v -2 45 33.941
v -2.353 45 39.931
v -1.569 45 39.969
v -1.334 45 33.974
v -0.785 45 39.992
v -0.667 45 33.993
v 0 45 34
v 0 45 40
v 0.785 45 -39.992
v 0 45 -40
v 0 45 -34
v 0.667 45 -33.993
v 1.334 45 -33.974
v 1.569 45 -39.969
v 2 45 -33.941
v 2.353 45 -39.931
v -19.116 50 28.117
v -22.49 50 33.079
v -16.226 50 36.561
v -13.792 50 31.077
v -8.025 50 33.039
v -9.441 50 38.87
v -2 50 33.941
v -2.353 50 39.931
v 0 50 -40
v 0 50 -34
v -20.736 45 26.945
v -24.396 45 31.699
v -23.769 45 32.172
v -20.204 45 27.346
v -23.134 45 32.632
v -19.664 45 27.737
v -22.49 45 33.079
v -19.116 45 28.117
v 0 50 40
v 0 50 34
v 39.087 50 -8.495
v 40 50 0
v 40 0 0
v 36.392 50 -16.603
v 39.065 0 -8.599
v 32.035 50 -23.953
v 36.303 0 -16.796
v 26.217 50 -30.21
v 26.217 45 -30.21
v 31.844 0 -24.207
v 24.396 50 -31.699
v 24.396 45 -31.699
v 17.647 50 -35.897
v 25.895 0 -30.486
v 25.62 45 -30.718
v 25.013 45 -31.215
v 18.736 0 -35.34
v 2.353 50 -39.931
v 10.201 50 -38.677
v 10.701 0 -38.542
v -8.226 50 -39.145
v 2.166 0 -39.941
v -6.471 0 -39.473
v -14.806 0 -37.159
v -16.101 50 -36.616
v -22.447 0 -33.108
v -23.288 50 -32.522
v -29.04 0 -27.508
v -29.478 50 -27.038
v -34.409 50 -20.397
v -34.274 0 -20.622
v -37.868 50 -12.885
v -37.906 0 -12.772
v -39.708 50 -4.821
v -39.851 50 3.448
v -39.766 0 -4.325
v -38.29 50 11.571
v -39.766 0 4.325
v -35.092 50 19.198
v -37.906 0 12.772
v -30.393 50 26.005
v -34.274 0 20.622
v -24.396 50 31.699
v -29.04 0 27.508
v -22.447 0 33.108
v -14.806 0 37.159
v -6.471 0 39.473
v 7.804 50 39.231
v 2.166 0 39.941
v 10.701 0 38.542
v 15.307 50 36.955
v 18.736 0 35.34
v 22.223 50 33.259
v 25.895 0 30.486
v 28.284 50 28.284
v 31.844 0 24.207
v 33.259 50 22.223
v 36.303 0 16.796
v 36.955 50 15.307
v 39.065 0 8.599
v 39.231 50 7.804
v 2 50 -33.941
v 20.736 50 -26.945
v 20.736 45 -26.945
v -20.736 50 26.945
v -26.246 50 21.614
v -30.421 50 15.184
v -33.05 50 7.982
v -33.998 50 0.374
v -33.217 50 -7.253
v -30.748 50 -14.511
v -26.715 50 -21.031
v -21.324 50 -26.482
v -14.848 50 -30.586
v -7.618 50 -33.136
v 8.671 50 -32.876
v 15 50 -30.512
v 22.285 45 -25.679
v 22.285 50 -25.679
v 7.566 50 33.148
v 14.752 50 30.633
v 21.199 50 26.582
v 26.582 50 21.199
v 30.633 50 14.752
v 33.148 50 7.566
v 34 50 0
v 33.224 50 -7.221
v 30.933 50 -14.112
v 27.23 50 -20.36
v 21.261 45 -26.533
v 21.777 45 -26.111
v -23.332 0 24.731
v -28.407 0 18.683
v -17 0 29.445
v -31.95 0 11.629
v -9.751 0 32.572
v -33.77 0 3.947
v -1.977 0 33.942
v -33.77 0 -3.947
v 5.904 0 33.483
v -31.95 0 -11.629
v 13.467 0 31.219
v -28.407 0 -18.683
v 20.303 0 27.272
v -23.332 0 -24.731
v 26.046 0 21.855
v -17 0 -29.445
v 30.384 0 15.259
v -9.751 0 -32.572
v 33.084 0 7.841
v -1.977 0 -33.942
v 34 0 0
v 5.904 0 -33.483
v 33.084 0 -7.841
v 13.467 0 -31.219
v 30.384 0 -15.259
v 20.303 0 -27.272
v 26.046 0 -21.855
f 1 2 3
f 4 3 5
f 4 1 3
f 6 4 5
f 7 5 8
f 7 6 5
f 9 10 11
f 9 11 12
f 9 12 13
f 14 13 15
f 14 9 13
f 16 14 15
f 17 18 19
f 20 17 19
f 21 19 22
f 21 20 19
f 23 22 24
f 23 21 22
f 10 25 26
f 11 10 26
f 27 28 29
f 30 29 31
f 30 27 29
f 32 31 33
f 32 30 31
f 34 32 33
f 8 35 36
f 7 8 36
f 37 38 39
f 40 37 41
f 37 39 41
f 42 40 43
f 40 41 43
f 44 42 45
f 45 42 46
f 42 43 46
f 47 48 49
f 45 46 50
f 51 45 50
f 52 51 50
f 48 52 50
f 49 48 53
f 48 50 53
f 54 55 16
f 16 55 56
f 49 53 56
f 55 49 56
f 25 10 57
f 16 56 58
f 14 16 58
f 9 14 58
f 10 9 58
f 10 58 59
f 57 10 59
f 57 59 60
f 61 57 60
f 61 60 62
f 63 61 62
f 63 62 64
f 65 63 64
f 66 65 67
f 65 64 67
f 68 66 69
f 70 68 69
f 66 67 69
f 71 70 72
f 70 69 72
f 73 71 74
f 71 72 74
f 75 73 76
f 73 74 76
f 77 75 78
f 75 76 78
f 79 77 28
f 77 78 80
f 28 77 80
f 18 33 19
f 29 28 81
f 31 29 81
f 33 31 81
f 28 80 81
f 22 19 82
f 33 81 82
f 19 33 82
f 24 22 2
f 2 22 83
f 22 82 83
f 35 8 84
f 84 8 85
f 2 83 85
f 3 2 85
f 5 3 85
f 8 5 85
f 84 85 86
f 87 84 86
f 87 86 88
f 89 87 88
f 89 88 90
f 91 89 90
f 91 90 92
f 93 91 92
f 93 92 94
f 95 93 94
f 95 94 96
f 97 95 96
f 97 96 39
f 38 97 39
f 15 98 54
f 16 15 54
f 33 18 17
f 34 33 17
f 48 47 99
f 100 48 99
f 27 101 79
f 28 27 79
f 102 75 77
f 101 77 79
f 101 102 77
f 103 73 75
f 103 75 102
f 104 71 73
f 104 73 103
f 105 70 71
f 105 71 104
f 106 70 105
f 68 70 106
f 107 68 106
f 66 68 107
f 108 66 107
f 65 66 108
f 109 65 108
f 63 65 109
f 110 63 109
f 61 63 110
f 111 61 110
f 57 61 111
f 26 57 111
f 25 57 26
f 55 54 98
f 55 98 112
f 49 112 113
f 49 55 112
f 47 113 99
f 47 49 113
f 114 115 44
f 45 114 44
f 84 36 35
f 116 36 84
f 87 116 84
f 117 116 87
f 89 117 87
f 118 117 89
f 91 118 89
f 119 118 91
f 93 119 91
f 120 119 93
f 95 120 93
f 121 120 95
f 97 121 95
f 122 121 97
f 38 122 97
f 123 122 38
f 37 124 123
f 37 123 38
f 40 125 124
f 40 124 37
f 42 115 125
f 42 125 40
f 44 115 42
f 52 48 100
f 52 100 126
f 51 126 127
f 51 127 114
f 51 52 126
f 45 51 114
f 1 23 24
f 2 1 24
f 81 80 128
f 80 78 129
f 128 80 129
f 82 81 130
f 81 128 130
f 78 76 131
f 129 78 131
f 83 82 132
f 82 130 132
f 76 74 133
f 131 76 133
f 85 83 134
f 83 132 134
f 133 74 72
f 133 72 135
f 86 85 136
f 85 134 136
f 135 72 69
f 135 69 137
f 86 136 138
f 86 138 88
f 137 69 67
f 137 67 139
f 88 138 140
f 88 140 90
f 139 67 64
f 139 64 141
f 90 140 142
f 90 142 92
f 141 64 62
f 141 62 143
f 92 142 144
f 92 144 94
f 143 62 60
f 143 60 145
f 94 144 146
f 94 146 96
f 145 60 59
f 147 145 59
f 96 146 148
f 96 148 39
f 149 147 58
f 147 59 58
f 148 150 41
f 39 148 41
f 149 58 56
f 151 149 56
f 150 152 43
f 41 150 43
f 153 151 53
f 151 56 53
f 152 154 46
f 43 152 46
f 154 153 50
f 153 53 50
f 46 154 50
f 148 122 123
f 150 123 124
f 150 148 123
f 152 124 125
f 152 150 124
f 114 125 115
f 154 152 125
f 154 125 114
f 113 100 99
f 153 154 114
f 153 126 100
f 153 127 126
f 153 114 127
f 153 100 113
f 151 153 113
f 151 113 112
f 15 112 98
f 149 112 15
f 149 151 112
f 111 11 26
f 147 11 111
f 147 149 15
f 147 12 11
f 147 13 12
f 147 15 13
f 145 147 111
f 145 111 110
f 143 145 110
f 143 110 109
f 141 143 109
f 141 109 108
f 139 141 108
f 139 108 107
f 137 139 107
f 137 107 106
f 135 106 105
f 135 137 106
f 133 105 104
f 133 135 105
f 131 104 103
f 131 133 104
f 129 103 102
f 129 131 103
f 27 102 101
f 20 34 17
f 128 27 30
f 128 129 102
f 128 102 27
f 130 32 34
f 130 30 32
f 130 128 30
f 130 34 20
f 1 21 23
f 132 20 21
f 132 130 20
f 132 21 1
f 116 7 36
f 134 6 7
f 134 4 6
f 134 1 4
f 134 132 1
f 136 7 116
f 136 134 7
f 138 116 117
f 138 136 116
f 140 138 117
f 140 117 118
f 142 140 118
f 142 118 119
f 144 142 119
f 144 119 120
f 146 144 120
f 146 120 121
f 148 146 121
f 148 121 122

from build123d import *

# Parameters (mm, degrees)
ESQUISSE1_R      = 40
ESQUISSE1_R_2    = 34
EXTRUSION1_DEPTH = 50
EXTRUSION2_DEPTH = 5


with BuildPart() as part:
    # Esquisse1 → Extrusion1 (new body)
    with BuildSketch(Plane(origin=(0, 0, 0), x_dir=(1, 0, 0), z_dir=(0, 1, 0))):
        Circle(ESQUISSE1_R)
        Circle(ESQUISSE1_R_2, mode=Mode.SUBTRACT)
    extrude(amount=EXTRUSION1_DEPTH)

    # Esquisse2 → Extrusion2 (cut)
    with BuildSketch(Plane(origin=(0, 50, 0), x_dir=(1, 0, 0), z_dir=(0, 1, 0))):
        with BuildLine():
            Line((0, -40), (0, -34))
            ThreePointArc((0, -34), (-1.000433182, -33.985278187), (-2, -33.941125497))
            Line((-2, -33.941125497), (-2.352941176, -39.930735879))
            ThreePointArc((-2.352941176, -39.930735879), (-1.176980214, -39.98268022), (0, -40))
        make_face()
        with BuildLine():
            Line((0, 40), (0, 34))
            ThreePointArc((0, 34), (1.000433182, 33.985278187), (2, 33.941125497))
            Line((2, 33.941125497), (2.352941176, 39.930735879))
            ThreePointArc((2.352941176, 39.930735879), (1.176980214, 39.98268022), (0, 40))
        make_face()
        with BuildLine():
            Line((24.395604074, 31.699440088), (20.736263463, 26.944524075))
            ThreePointArc((20.736263463, 26.944524075), (21.519778552, 26.322977245), (22.284673889, 25.678654748))
            Line((22.284673889, 25.678654748), (26.217263399, 30.210182057))
            ThreePointArc((26.217263399, 30.210182057), (25.317386532, 30.968208524), (24.395604074, 31.699440088))
        make_face()
        with BuildLine():
            Line((-22.489530894, -33.079011475), (-19.11610126, -28.117159754))
            ThreePointArc((-19.11610126, -28.117159754), (-19.934806548, -27.542757449), (-20.736263463, -26.944524075))
            Line((-20.736263463, -26.944524075), (-24.395604074, -31.699440088))
            ThreePointArc((-24.395604074, -31.699440088), (-23.452713586, -32.403244058), (-22.489530894, -33.079011475))
        make_face()
    extrude(amount=-EXTRUSION2_DEPTH, mode=Mode.SUBTRACT)


solid = part.part
